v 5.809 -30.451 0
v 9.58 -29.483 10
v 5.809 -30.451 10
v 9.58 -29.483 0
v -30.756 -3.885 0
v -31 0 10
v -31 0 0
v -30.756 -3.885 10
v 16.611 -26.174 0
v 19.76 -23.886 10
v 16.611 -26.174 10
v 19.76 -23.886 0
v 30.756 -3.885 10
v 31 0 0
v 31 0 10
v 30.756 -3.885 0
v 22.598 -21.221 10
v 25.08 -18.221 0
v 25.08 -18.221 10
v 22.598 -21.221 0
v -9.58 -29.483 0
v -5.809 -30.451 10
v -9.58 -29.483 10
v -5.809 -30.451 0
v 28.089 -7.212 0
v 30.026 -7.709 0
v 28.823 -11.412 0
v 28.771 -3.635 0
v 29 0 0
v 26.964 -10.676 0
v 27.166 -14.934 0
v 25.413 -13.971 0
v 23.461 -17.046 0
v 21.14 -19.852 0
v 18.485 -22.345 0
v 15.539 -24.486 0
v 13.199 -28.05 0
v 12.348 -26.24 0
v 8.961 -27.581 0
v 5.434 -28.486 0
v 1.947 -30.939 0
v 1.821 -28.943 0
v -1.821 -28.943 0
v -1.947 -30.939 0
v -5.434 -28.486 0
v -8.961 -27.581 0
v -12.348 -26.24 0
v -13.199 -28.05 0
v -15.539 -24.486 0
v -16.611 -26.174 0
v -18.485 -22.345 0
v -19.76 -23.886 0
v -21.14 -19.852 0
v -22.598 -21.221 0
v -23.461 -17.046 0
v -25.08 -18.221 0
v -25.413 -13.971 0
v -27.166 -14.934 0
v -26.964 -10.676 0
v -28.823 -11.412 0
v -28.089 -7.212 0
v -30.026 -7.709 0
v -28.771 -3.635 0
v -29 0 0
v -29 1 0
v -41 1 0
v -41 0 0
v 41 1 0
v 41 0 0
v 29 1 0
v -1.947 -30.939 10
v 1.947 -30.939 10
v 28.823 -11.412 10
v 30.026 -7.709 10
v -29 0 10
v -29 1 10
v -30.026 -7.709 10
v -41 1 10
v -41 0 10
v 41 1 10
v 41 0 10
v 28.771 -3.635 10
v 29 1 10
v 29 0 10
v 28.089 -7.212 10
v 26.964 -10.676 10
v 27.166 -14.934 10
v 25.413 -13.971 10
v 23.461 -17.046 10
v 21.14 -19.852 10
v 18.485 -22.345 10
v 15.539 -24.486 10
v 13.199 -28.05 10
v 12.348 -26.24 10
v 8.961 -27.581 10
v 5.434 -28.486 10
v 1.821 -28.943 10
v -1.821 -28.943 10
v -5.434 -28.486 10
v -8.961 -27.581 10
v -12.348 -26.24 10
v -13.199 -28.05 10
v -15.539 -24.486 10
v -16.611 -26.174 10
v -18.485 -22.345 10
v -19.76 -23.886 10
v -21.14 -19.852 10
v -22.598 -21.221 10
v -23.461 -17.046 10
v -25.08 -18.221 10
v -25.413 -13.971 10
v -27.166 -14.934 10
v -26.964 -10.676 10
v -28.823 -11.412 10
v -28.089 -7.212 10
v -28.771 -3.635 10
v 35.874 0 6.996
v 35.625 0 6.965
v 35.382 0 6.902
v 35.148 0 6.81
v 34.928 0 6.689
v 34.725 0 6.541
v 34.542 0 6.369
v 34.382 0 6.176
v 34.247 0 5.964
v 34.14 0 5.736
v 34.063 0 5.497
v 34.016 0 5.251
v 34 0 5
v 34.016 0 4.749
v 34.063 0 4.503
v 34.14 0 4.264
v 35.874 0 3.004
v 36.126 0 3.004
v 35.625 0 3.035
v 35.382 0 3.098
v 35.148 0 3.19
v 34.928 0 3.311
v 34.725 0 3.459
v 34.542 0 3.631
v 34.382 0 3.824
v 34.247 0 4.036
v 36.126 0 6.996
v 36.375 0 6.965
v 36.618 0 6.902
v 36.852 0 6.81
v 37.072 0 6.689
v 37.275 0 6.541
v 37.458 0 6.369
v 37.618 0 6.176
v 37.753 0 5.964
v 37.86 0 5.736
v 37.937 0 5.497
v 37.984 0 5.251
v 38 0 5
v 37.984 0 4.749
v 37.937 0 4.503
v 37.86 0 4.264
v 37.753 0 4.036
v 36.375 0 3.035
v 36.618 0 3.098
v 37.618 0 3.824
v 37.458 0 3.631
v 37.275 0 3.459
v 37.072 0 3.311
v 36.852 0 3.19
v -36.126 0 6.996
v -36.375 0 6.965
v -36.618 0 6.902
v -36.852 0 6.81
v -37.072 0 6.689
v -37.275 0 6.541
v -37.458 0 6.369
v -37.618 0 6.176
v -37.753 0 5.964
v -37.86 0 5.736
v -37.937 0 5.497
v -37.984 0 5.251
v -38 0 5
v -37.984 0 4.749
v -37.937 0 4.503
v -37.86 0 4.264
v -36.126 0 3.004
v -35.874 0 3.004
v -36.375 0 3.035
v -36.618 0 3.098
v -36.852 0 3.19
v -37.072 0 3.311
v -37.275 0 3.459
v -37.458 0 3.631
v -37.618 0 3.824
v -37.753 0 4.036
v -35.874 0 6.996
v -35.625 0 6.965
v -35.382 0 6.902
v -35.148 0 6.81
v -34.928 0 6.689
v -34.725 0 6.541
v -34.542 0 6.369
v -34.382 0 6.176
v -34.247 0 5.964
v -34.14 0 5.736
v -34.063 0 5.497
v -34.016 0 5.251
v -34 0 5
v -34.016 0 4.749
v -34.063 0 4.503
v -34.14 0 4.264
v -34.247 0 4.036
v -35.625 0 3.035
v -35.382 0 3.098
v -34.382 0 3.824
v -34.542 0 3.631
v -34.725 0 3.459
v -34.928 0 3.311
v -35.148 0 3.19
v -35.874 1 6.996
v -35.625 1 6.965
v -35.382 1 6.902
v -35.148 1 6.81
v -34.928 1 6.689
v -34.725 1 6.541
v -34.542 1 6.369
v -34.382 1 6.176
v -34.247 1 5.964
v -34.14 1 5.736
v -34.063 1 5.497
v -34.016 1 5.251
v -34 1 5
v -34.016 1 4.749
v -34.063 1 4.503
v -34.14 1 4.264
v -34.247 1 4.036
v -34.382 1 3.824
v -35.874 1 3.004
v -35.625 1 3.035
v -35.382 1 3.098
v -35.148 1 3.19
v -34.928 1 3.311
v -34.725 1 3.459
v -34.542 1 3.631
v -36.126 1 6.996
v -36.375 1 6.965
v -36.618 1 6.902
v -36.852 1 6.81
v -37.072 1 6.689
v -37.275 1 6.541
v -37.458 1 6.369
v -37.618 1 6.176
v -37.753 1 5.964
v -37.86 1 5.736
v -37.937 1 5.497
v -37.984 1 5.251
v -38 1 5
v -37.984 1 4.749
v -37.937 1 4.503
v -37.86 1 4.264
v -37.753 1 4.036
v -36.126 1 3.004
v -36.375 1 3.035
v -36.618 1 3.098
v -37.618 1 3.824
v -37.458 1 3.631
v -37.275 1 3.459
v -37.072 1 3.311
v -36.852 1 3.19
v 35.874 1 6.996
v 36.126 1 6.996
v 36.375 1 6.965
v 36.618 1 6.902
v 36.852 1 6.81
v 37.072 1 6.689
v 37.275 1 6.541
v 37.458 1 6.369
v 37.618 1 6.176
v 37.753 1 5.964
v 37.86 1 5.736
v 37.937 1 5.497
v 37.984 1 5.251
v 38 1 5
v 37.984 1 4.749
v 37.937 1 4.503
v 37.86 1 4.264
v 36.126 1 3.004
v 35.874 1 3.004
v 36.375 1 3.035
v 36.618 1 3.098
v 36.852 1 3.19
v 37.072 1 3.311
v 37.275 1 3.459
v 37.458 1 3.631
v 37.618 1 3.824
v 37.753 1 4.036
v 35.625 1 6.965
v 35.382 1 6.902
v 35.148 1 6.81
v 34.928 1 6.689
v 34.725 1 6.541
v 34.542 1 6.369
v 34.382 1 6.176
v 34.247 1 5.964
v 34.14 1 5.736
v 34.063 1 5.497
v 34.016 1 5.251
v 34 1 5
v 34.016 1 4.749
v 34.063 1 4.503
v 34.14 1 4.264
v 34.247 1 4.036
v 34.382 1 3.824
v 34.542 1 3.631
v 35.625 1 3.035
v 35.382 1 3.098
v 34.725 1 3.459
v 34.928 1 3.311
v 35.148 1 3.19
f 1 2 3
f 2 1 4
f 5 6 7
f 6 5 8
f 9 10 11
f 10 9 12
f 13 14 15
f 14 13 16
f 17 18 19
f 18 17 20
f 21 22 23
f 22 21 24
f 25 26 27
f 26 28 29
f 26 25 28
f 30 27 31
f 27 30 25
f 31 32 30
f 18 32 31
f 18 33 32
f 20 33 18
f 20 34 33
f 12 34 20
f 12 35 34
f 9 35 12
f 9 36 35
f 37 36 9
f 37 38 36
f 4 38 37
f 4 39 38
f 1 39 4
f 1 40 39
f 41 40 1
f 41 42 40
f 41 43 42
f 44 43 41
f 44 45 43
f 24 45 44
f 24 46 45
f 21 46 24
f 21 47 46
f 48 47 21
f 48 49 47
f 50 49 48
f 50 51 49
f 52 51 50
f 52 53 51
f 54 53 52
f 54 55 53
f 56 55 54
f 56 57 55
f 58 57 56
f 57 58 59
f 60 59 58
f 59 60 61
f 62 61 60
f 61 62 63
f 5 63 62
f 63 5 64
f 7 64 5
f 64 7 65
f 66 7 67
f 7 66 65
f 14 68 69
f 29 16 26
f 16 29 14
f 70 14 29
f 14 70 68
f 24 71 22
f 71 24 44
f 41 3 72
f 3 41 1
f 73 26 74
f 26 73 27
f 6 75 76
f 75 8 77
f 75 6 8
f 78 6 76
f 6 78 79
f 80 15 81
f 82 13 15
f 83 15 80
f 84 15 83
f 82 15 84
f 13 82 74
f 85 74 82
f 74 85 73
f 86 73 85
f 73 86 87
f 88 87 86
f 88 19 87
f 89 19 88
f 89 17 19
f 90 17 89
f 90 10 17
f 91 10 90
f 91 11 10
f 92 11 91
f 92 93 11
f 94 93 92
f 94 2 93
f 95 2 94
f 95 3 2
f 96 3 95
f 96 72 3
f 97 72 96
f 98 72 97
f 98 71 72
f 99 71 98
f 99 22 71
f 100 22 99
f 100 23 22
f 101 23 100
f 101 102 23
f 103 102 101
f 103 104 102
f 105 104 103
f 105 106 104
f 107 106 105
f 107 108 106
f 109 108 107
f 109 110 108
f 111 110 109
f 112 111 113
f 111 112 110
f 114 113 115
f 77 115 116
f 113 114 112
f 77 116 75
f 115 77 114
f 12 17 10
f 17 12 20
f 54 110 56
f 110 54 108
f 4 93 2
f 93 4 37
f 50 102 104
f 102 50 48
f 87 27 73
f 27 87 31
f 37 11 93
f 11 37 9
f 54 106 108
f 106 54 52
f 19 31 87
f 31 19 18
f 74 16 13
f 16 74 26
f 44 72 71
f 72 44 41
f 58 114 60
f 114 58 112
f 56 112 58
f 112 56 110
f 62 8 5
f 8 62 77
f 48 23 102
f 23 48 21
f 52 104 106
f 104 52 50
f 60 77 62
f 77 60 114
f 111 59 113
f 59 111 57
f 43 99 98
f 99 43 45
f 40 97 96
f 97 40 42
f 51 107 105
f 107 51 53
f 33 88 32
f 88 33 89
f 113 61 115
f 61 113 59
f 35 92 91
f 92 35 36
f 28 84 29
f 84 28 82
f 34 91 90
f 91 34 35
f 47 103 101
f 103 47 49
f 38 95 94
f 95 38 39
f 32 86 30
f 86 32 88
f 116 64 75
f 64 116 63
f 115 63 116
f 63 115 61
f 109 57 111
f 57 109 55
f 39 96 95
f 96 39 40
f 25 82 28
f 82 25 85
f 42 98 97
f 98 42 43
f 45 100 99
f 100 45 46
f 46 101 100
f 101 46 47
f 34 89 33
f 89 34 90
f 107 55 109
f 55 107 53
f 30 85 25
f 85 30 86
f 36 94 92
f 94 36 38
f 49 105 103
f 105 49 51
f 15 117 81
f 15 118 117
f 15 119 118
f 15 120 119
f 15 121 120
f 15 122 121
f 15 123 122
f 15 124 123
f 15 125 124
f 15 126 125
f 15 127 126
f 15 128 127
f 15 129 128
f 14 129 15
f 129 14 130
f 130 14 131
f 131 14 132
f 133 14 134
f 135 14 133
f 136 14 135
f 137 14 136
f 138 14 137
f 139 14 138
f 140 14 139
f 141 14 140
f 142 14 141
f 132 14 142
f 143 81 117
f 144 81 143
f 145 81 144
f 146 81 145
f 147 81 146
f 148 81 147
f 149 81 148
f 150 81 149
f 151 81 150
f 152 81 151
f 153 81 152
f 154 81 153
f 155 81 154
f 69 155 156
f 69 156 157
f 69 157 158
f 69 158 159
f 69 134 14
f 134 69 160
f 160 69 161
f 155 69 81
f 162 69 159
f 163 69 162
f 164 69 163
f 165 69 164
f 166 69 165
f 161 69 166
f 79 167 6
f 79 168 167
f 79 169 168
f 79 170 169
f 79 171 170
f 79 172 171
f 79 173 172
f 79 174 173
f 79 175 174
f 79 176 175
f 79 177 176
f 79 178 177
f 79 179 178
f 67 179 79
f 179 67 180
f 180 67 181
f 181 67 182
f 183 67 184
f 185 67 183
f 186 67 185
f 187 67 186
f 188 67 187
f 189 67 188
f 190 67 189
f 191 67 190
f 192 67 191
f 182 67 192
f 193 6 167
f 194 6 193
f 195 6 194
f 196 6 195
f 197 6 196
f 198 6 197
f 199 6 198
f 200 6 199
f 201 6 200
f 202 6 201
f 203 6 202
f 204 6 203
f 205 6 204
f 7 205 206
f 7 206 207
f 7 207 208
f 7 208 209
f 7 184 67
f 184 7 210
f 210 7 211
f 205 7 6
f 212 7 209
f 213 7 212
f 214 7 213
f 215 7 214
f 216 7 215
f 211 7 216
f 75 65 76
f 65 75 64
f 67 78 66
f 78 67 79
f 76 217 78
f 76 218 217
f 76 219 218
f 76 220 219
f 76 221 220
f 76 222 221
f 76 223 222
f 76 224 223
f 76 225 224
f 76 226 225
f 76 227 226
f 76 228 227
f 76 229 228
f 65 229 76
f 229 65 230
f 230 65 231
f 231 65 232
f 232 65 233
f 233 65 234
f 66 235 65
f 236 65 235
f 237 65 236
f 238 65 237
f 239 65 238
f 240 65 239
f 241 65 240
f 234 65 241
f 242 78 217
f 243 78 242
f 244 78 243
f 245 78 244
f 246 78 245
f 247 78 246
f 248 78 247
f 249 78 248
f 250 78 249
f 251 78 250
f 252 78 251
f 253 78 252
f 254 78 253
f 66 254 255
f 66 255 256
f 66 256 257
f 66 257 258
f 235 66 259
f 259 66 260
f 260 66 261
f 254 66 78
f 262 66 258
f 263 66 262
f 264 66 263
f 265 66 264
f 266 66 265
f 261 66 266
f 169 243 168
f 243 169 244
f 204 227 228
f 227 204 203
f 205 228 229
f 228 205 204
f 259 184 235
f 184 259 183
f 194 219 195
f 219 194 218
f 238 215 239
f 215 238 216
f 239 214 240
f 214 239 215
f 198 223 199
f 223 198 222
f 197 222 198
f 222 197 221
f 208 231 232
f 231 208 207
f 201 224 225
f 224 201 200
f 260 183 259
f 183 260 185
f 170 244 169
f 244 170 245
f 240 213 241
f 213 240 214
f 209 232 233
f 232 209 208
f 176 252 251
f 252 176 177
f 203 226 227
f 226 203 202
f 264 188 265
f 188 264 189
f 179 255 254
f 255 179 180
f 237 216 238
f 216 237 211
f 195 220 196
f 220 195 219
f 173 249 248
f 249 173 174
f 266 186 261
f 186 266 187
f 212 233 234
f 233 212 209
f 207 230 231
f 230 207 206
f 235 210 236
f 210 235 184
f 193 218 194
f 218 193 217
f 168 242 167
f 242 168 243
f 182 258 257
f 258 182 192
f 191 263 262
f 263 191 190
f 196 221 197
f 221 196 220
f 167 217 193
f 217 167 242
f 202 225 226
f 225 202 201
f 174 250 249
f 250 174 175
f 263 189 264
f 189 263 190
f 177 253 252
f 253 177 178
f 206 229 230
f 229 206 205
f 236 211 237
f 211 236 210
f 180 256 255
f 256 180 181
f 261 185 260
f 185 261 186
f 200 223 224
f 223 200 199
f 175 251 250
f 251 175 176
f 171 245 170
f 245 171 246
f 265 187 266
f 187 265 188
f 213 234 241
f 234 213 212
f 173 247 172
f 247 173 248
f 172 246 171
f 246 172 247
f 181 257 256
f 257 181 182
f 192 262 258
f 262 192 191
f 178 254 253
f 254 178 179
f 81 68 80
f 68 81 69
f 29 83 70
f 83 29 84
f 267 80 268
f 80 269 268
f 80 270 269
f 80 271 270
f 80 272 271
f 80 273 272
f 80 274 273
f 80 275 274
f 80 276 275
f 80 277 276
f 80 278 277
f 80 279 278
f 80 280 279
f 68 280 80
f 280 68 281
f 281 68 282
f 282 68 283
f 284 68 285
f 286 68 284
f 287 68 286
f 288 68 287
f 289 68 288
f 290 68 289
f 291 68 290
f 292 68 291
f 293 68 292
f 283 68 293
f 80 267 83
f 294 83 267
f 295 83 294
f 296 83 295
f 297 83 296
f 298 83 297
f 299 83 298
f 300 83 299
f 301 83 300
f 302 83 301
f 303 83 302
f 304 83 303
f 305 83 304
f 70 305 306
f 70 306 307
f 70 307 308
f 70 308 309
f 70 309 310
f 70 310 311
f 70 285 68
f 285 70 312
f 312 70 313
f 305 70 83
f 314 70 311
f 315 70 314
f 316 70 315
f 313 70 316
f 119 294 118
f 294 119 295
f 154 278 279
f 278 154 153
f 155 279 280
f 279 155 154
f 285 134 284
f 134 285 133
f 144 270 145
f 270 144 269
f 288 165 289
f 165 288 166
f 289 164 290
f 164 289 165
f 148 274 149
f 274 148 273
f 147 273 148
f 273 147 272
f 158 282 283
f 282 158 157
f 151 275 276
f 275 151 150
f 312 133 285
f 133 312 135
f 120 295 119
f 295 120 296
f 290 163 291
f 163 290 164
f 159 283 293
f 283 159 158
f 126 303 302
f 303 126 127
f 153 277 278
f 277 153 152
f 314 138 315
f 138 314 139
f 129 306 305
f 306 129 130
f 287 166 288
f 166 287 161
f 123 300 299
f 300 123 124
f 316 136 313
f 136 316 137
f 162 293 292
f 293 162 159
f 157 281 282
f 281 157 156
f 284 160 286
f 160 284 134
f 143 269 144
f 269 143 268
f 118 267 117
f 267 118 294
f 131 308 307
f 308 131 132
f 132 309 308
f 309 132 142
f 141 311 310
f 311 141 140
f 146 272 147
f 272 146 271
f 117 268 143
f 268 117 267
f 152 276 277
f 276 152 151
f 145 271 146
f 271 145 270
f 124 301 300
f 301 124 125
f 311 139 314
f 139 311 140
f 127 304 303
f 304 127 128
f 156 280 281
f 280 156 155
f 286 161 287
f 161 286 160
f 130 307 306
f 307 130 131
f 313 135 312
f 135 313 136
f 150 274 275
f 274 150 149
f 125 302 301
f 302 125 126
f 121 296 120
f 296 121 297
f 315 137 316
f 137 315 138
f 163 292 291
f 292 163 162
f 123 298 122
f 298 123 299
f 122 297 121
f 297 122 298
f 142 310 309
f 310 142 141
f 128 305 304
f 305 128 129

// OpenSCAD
diameter = 58;
outerdiam = 4;
width = 2;
height = 10;
screw = 4;
screwHolder = 10 + width;

$fn = 50;
part = 0;

module screwSupport(right, supHeight, bigger) {
    difference() {     
        cube([screwHolder, supHeight, height]);

        translate([screwHolder / 2 + (right * width / 2), supHeight * 2, height / 2]) rotate([90, 0, 0]) cylinder(d = screw, h = supHeight * 4);

        if(bigger == 1) {
            translate([right * width * 2, 0, 0]) cube([screwHolder, supHeight - width, height]);
        }
    }
}

if(part == 0) {
    union() {
        difference() {
            cylinder(d = diameter + outerdiam, h = height);
            cylinder(d = diameter, h = height);

            translate([-diameter, 0, 0]) cube([diameter * 2, (diameter + width), height]);
        }

        translate([-(diameter / 2 + screwHolder), 0, 0]) screwSupport(-1, width / 2);
        translate([diameter / 2, 0, 0]) screwSupport(1, width / 2);
    }
}


holderHeight = diameter / 2 + 30;

if(part == 1) {
    union() {
        translate([-diameter / 2, 0, 0]) cube([diameter, width, height]);

        translate([-(diameter / 2 + screwHolder), 0, 0]) screwSupport(-1, holderHeight, 1);
        translate([diameter / 2, 0, 0]) screwSupport(1, holderHeight, 1);
    }
}
